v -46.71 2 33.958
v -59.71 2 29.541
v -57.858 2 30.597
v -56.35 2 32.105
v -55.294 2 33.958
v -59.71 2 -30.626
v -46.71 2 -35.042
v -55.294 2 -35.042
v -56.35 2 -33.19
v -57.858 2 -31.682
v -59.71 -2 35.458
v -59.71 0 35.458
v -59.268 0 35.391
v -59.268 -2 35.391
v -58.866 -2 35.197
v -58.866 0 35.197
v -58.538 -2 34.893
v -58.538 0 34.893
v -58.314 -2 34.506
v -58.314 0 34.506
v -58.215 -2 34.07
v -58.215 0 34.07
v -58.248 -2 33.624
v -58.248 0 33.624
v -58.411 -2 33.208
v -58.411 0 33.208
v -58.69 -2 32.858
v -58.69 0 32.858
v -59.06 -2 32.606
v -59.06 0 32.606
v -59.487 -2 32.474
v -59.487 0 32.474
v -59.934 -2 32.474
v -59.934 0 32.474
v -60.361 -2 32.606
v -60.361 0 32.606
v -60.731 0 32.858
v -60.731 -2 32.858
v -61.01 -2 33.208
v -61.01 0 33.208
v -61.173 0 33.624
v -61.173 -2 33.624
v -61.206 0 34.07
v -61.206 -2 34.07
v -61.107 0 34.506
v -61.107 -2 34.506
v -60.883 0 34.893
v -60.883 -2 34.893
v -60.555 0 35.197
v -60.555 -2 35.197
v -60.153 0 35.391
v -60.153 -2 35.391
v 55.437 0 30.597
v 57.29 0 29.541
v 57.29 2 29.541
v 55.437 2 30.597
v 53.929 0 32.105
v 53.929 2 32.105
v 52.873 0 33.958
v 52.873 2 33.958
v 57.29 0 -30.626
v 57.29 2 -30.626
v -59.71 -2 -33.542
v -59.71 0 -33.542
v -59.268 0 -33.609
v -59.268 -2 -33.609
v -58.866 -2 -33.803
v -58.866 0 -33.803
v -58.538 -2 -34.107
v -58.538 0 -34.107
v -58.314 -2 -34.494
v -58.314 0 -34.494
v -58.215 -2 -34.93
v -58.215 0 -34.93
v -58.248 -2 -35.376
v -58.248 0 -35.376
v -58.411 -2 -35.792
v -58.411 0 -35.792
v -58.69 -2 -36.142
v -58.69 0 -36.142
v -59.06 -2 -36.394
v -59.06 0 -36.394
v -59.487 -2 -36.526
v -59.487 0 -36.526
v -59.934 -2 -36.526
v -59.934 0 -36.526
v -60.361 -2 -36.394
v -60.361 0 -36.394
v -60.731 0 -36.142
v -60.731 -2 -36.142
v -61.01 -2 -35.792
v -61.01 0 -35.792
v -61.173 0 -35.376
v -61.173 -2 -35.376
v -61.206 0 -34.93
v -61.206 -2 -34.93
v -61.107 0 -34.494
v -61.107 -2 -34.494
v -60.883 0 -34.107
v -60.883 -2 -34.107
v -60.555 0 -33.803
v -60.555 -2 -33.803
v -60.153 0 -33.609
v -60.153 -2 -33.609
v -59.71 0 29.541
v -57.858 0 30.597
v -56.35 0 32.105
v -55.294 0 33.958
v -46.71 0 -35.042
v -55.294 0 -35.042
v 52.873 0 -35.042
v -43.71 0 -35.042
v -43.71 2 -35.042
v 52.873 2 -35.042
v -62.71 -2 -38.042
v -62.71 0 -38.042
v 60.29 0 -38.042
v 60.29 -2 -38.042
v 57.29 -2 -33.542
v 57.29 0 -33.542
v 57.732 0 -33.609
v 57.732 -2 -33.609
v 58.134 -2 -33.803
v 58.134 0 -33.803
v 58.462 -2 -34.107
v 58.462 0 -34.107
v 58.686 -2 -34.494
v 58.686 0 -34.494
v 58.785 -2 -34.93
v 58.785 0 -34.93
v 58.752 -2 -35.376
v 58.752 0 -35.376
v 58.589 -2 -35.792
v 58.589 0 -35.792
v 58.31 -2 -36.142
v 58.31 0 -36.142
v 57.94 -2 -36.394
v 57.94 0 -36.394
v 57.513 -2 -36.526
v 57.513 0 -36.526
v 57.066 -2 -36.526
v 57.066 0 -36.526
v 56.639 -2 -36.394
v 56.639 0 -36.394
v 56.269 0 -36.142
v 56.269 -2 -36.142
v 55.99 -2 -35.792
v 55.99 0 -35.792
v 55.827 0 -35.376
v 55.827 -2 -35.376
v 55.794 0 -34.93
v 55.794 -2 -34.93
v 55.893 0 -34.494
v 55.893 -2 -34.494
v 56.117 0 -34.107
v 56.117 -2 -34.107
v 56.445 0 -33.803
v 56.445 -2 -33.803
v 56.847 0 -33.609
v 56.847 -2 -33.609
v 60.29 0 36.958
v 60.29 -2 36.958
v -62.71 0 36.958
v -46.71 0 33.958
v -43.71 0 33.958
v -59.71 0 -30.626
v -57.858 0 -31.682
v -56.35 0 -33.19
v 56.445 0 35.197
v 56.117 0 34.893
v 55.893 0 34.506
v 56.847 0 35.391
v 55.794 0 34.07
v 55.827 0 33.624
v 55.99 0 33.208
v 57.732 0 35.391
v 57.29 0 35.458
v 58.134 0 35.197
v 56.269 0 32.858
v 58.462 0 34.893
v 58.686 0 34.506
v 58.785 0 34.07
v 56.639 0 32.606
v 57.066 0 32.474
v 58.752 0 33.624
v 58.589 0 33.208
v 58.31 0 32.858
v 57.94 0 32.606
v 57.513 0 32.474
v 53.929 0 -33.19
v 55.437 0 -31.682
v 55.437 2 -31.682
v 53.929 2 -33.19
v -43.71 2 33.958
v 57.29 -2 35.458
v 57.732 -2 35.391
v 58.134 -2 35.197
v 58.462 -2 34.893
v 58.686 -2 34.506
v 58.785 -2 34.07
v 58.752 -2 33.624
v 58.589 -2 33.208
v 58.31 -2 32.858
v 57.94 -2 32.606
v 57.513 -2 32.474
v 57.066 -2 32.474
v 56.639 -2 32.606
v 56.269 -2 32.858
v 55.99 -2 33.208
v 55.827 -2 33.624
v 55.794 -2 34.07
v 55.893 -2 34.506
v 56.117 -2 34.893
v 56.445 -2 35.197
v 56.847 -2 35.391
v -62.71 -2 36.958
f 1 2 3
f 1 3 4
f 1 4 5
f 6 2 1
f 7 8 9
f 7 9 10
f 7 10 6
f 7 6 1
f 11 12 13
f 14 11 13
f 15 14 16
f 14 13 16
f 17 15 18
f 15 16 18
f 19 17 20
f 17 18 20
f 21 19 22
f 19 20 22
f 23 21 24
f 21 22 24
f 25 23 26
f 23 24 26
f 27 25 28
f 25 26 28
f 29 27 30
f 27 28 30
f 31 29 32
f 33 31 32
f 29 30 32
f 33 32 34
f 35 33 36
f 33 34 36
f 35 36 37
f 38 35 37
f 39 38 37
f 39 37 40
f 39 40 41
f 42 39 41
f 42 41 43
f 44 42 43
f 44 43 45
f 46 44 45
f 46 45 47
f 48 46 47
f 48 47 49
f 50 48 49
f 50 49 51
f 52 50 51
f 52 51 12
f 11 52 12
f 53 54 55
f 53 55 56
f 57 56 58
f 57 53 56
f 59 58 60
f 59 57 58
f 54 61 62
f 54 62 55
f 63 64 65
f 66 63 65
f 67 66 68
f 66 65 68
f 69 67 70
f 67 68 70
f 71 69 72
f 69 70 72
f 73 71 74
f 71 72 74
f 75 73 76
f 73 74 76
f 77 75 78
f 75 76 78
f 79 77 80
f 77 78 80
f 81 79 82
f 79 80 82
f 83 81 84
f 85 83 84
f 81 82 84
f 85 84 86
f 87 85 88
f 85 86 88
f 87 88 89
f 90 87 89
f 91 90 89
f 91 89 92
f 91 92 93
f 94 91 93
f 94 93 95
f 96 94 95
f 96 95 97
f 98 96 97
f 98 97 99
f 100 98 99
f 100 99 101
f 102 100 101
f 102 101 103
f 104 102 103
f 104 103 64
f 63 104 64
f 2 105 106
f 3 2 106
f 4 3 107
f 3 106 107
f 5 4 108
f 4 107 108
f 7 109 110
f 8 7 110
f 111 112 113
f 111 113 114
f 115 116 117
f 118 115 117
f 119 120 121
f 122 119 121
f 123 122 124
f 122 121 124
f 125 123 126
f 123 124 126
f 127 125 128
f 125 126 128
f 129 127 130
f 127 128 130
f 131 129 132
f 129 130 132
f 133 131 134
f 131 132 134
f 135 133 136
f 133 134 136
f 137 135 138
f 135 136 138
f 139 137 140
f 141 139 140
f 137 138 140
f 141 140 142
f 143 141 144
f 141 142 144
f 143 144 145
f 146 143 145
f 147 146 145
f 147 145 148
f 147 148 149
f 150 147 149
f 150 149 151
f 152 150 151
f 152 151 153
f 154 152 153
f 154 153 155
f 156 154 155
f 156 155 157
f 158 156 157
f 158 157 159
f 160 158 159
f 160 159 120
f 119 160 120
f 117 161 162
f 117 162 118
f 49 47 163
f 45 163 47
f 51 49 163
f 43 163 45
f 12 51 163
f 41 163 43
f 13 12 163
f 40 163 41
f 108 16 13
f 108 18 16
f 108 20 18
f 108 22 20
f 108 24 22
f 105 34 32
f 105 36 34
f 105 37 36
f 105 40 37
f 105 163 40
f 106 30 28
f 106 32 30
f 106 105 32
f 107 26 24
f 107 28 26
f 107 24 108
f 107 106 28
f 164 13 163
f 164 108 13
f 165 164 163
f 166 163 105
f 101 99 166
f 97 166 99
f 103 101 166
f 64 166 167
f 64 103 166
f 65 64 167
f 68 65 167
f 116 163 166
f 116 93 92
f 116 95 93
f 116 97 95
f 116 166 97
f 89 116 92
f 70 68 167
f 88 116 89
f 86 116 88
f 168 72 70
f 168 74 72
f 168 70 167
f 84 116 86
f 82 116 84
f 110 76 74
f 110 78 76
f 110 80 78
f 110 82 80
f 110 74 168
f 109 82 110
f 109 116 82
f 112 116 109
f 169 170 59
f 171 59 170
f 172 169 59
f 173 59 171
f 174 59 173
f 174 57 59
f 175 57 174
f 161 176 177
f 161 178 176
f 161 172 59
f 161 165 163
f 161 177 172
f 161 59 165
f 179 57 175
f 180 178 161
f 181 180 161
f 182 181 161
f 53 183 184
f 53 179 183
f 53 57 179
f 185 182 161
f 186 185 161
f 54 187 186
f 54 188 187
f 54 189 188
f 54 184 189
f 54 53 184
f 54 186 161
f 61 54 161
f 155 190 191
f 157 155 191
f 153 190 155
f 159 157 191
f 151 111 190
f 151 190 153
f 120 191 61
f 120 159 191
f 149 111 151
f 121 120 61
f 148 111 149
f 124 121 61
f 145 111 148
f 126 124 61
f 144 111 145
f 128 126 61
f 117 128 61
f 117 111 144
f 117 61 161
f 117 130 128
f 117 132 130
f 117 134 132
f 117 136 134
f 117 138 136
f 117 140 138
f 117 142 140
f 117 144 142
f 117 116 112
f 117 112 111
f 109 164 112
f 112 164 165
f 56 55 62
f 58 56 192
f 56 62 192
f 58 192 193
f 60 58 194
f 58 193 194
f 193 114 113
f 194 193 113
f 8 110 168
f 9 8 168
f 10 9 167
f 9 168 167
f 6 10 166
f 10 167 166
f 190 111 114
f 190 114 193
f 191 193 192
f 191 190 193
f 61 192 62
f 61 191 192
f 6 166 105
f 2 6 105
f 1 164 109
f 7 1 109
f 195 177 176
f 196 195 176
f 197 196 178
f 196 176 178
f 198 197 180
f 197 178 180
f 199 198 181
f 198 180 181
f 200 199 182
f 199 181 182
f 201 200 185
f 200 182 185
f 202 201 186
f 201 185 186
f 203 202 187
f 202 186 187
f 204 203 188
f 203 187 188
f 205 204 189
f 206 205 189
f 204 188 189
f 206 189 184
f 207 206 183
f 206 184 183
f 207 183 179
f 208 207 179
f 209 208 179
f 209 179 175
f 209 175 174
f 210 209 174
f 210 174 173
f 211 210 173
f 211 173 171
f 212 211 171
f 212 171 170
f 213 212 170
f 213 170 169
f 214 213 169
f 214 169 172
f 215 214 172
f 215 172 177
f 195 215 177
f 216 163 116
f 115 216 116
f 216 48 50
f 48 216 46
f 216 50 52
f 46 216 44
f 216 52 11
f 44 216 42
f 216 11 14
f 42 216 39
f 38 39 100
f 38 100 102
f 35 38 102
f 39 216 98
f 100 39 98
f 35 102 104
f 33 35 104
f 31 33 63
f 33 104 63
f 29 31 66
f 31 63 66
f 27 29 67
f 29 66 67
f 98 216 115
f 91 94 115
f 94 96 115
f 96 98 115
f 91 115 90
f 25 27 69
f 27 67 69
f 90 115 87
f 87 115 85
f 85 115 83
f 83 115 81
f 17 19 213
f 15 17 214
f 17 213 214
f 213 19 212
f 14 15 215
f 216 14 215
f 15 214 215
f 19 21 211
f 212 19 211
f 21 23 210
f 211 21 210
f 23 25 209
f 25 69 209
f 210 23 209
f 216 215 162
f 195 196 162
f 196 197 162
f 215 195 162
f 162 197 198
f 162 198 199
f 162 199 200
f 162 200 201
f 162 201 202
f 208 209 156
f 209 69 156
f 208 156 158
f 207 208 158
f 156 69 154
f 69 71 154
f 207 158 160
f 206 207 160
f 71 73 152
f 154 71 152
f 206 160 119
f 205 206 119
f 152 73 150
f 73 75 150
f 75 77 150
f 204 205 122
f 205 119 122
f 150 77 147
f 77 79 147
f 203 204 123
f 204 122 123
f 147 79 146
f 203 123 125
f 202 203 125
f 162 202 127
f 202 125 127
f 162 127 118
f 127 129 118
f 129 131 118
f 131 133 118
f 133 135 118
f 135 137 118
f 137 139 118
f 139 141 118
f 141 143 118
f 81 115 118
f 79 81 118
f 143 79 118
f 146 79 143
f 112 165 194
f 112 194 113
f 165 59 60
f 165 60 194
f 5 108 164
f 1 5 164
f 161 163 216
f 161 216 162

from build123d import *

# Parameters (mm, degrees)
EXTRUDE_1_DEPTH     = 2
EXTRUDE_2_DEPTH     = 2
SKETCH_1_5_W        = 123
SKETCH_1_5_H        = 75
EXTRUDE_3_DEPTH     = 2
SKETCH_1_6_R        = 1.5
CUT_EXTRUDE_1_DEPTH = 12


with BuildPart() as part:
    # Эскиз1 → Бобышка-Вытянуть1 (new body)
    with BuildSketch(Plane(origin=(0, 0, 0), x_dir=(1, 0, 0), z_dir=(0, 1, 0))):
        with BuildLine():
            Line((-46.710495983, 35.042327972), (-55.294297496, 35.042327972))
            ThreePointArc((-55.294297496, 35.042327972), (-57.053641733, 32.385473722), (-59.710495983, 30.626129484))
            Line((-59.710495983, 30.626129484), (-59.710495983, -29.541473541))
            ThreePointArc((-59.710495983, -29.541473541), (-57.053641733, -31.300817779), (-55.294297496, -33.957672028))
            Line((-55.294297496, -33.957672028), (-46.710495983, -33.957672028))
            Line((-46.710495983, -33.957672028), (-46.710495983, 35.042327972))
        make_face()
    extrude(amount=EXTRUDE_1_DEPTH)



with BuildPart() as body_2:
    # Эскиз1<4> → Бобышка-Вытянуть2 (new body)
    with BuildSketch(Plane(origin=(0, 0, 0), x_dir=(1, 0, 0), z_dir=(0, 1, 0))):
        with BuildLine():
            Line((-43.710495983, 35.042327972), (52.87330553, 35.042327972))
            ThreePointArc((52.87330553, 35.042327972), (54.632649768, 32.385473722), (57.289504017, 30.626129484))
            Line((57.289504017, 30.626129484), (57.289504017, -29.541473541))
            ThreePointArc((57.289504017, -29.541473541), (54.632649768, -31.300817779), (52.87330553, -33.957672028))
            Line((52.87330553, -33.957672028), (-43.710495983, -33.957672028))
            Line((-43.710495983, -33.957672028), (-43.710495983, 35.042327972))
        make_face()
    extrude(amount=EXTRUDE_2_DEPTH)


with BuildPart() as part_1:
    add(part.part)

    add(body_2.part)  # Бобышка-Вытянуть3 merges body 2
    # Эскиз1<5> → Бобышка-Вытянуть3 (add)
    with BuildSketch(Plane(origin=(0, 0, 0), x_dir=(1, 0, 0), z_dir=(0, 1, 0))):
        with Locations((-1.210495983, 0.542327972)):
            Rectangle(SKETCH_1_5_W, SKETCH_1_5_H)
    extrude(amount=-EXTRUDE_3_DEPTH)

    # Эскиз1<6> → Вырез-Вытянуть1 (cut)
    with BuildSketch(Plane(origin=(0, 0, 0), x_dir=(1, 0, 0), z_dir=(0, 1, 0))):
        with Locations((-59.710495983, 35.042327972)):
            Circle(SKETCH_1_6_R)
        with Locations((-59.710495983, -33.957672028)):
            Circle(SKETCH_1_6_R)
        with Locations((57.289504017, -33.957672028)):
            Circle(SKETCH_1_6_R)
        with Locations((57.289504017, 35.042327972)):
            Circle(SKETCH_1_6_R)
    extrude(amount=-CUT_EXTRUDE_1_DEPTH, mode=Mode.SUBTRACT)


solid = part_1.part
